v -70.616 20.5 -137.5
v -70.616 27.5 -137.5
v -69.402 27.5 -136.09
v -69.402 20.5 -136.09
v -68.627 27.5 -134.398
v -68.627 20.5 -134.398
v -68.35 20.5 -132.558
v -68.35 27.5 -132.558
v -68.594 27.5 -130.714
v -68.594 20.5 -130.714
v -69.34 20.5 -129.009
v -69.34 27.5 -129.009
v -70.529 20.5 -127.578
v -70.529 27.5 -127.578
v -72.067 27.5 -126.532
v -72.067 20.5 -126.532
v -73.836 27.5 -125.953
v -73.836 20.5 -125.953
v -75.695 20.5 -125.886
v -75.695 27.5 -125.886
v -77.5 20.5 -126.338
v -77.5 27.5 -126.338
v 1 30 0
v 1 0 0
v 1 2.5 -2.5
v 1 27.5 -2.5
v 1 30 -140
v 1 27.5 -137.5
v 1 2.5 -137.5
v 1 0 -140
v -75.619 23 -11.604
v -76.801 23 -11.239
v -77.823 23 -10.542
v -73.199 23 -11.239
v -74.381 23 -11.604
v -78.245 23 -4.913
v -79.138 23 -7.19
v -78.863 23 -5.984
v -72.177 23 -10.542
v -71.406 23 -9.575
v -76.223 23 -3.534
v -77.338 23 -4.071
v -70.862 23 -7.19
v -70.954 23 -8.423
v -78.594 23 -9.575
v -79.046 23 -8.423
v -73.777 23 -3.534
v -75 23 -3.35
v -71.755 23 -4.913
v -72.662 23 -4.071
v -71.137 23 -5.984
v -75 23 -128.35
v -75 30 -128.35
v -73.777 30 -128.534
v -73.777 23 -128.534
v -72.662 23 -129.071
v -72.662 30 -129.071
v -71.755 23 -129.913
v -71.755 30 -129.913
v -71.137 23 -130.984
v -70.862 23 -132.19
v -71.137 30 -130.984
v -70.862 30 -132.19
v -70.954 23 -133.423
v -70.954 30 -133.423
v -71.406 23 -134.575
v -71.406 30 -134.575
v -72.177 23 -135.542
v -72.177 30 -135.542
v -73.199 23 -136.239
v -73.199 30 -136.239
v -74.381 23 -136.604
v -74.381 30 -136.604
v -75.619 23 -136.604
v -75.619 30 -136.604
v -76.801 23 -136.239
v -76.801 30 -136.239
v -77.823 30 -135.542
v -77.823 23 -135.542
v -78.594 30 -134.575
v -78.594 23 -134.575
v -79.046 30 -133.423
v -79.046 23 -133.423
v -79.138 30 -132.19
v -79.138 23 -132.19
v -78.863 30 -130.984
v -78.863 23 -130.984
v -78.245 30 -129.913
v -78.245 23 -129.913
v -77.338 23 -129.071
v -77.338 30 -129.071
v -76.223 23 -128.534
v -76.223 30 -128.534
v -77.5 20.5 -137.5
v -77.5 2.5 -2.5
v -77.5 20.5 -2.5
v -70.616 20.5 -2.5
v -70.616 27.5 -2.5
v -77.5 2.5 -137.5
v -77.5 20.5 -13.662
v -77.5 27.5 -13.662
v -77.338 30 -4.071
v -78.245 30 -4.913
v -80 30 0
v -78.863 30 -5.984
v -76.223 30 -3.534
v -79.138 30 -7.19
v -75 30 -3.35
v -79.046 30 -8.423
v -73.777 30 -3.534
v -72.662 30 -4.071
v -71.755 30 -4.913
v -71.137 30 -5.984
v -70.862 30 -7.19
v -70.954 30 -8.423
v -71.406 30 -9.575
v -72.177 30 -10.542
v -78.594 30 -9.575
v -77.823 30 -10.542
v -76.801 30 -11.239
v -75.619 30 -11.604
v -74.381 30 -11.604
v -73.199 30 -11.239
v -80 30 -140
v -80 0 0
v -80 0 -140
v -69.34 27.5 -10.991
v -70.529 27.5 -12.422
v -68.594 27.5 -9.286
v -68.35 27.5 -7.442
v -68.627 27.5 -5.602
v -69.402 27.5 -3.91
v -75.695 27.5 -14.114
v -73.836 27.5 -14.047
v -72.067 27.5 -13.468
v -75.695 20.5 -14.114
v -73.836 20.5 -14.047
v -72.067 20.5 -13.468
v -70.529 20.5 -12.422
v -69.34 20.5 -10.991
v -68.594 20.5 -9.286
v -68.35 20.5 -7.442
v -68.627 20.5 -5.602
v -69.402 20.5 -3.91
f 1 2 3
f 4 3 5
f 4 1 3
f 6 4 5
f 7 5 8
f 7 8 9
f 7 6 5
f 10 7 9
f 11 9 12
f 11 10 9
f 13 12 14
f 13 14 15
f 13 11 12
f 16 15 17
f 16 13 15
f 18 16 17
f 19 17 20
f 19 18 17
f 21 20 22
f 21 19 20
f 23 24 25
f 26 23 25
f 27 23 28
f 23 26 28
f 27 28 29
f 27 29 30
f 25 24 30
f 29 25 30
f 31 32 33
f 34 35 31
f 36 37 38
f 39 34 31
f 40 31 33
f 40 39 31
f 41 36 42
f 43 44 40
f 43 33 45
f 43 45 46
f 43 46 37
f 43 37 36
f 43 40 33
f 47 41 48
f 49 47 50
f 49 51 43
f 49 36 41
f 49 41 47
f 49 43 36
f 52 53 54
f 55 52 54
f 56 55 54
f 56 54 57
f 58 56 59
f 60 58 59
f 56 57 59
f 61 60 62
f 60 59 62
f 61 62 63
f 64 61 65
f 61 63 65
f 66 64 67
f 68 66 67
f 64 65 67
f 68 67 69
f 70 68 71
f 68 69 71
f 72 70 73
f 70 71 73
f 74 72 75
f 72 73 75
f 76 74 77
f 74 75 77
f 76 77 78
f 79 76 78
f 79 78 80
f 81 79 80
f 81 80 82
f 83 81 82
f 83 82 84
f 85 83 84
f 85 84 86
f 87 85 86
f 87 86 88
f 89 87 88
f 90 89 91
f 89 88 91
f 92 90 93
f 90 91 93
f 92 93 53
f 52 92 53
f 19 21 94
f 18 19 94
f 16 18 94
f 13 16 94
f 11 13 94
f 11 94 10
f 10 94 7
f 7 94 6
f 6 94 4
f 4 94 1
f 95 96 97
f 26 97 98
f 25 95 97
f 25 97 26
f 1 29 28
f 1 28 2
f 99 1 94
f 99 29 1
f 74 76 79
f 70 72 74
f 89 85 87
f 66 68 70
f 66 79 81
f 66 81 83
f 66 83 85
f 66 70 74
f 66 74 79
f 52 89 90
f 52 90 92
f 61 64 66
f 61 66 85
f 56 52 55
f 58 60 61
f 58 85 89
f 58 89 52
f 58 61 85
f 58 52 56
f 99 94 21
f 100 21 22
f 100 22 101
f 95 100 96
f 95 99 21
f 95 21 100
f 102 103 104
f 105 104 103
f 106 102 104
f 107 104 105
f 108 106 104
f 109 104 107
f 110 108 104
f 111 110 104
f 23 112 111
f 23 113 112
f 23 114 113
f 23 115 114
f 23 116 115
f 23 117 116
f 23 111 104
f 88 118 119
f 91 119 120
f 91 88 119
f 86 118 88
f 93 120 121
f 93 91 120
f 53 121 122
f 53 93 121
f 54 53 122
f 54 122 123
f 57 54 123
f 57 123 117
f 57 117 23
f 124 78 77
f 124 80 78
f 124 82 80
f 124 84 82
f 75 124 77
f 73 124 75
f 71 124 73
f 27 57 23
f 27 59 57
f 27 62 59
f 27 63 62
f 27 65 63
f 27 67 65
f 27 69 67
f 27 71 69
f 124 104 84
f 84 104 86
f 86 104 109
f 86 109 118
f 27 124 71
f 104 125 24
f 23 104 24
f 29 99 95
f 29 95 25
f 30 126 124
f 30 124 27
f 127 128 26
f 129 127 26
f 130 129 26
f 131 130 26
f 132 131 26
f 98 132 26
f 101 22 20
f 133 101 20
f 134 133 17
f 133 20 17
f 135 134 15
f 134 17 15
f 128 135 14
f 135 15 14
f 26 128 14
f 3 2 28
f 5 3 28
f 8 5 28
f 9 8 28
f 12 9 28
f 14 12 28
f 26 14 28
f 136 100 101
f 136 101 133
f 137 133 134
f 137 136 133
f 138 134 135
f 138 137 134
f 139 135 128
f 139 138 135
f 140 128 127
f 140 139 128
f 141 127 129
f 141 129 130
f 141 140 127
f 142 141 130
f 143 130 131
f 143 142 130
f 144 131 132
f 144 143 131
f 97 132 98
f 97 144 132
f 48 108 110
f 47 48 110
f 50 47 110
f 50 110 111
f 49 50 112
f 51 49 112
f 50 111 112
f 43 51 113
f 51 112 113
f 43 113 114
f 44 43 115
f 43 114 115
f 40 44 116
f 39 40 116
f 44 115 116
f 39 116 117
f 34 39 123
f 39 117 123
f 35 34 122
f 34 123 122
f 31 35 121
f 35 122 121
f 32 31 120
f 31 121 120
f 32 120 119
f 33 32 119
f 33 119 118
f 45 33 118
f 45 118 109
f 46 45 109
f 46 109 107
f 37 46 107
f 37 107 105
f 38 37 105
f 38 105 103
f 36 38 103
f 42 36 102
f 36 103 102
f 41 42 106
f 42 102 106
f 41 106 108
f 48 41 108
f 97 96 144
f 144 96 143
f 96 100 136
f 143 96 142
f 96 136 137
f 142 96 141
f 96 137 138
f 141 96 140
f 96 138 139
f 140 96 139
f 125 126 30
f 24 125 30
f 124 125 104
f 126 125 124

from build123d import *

# Parameters (mm, degrees)
SKETCH1_W           = 81
SKETCH1_H           = 140
BOSS_EXTRUDE2_DEPTH = 30
SKETCH3_R           = 4.15
CUT_EXTRUDE2_DEPTH  = 7
SHELL1_START        = 2.5
SHELL1_DEPTH        = 25
SHELL1_2_DEPTH      = 18


# Read off the part's stored shape, not the designer's step: Shell1
with BuildPart() as part:
    # Sketch1 → Boss-Extrude2 (new body)
    with BuildSketch(Plane(origin=(0, 0, 0), x_dir=(1, 0, 0), z_dir=(0, 1, 0))):
        with Locations((-39.5, 70)):
            Rectangle(SKETCH1_W, SKETCH1_H)
    extrude(amount=BOSS_EXTRUDE2_DEPTH)

    # Sketch3 → Cut-Extrude2 (cut)
    with BuildSketch(Plane(origin=(0, 30, 0), x_dir=(1, 0, 0), z_dir=(0, 1, 0))):
        with Locations(Location((-75, 7.5, 0), (0, 0, 270))):
            Circle(SKETCH3_R)
        with Locations(Location((-75, 132.5, 0), (0, 0, 270))):
            Circle(SKETCH3_R)
    extrude(amount=-CUT_EXTRUDE2_DEPTH, mode=Mode.SUBTRACT)

    # Shell1 outline → Shell1 (cut)
    with BuildSketch(Plane(origin=(0, 0, 0), x_dir=(1, 0, 0), z_dir=(0, 1, 0)).offset(SHELL1_START)):
        with BuildLine():
            Line((1, 137.5), (-70.615652842, 137.5))
            ThreePointArc((-70.615652842, 137.5), (-69.339940487, 129.009122415), (-77.5, 126.337816945))
            Line((-77.5, 126.337816945), (-77.5, 13.662183055))
            ThreePointArc((-77.5, 13.662183055), (-69.339940487, 10.990877585), (-70.615652842, 2.5))
            Line((-70.615652842, 2.5), (1, 2.5))
            Line((1, 2.5), (1, 137.5))
        make_face()
    extrude(amount=SHELL1_DEPTH, mode=Mode.SUBTRACT)

    # Shell1 2 outline → Shell1 2 (cut)
    with BuildSketch(Plane(origin=(0, 0, 0), x_dir=(1, 0, 0), z_dir=(0, 1, 0)).offset(SHELL1_START)):
        with BuildLine():
            Line((-70.615652842, 137.5), (-77.5, 137.5))
            Line((-77.5, 137.5), (-77.5, 126.337816945))
            ThreePointArc((-77.5, 126.337816945), (-69.339940487, 129.009122415), (-70.615652842, 137.5))
        make_face()
        with BuildLine():
            ThreePointArc((-70.615652842, 2.5), (-69.339940487, 10.990877585), (-77.5, 13.662183055))
            Line((-77.5, 13.662183055), (-77.5, 2.5))
            Line((-77.5, 2.5), (-70.615652842, 2.5))
        make_face()
    extrude(amount=SHELL1_2_DEPTH, mode=Mode.SUBTRACT)


solid = part.part
